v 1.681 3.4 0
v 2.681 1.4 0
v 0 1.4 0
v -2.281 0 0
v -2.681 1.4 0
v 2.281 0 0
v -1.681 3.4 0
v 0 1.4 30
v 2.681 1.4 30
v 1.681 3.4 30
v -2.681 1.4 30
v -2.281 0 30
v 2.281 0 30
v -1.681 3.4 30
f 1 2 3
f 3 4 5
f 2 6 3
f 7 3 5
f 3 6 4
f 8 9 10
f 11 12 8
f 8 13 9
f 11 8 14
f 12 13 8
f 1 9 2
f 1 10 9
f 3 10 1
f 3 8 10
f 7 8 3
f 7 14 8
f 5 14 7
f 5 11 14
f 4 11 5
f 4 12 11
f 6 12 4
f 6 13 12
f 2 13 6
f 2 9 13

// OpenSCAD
//MD = 3.175;
MD = 4.7625;
LAYER_HEIGHT = 0.2;

// REFERENCE CIRCLE
*translate([0, 5 * MD / 6])  circle(d = MD, $fn = 32);

// S
*group() {
  difference() {
    union() {
      rotate([0,0,45]) rotate_extrude(angle = 270, $fn = 128)
        translate([10, 0, 0])
          flatTrack();

      translate([cos(45) * 20, sin(45) * 20])
        rotate([0,0,-135]) rotate_extrude(angle = 270, $fn = 128)
          translate([10, 0, 0])
            flatTrack();
    }
  }
}




module tunnelPair(h, baseTr, base, holeTr, holeD, angle = 5) {
  difference() {
    linear_extrude(h / 3)
      difference() {
        translate(baseTr) 
          square(base);

        translate(holeTr)
          circle(d = holeD, $fn = 32);
      }
      
    rotate([angle, 0, 0]) 
      translate([0, 0, -h / 2]) 
        linear_extrude(h) 
          flatTrack(lowerMid = false);
  }
}

module trackConnectorTunnel(d = MD, h = 5, lh = LAYER_HEIGHT, angle = 5, hExtra = H_EXTRA) {
  holeDLayers = ceil(d * 1.25 / lh);
  holeD = holeDLayers * lh;
  holeTr = [0, holeD - 0.2];

  baseYs = [6, holeDLayers + hExtra];
  base = [d * 2, lh * (baseYs[0] + baseYs[1])];
  baseTr = [-base[0] / 2, -1 * lh * baseYs[0]];
  
  tunnelPair(h, baseTr, base, holeTr, holeD, angle);
    
  translate([0, 0, h / 3])
    linear_extrude(2 * h / 3)
      difference() {
        translate(baseTr) 
          square(base);

        translate(holeTr)
          circle(d = holeD, $fn = 32);
      }
}

H_EXTRA = 20;
hExtra = H_EXTRA;
holeDLayers = ceil(MD * 1.25 / LAYER_HEIGHT);
holeD = holeDLayers * LAYER_HEIGHT;
ty = holeD - 0.2;
baseYs = [6, holeDLayers + hExtra];
base = [MD * 2, LAYER_HEIGHT * (baseYs[0] + baseYs[1])];

*group() {
  trackConnectorTunnel();

  translate([MD, ty, 4.9]) {
    difference() {
      union() {
        translate([-base[0], -base[1] / 2 - 1.4, 0.1])
          hull() {
            linear_extrude(1)
              square([base[0] * 2, base[1] / 1.5]);
            
            translate([0, 3 * base[1] / 6, 8]) 
              linear_extrude(1)
                square([base[0] * 2, base[1] / 6]);          
          }
      }
      
      rotate([90, 0, 0])
        rotate_extrude(angle = 180, convexity = 4, $fn = 64) 
          translate([MD, 0, 0]) 
            circle(d = holeD, $fn = 32);
    }  
  }

  translate([MD * 2, 0])
    trackConnectorTunnel(angle = -5);
}

linear_extrude(30) flatTrack();

*translate([0, MD + 0.15]) circle(d = MD, $fn = 32);


module flatTrack(d = MD, lh = LAYER_HEIGHT, lowerMid = true) {
  ys = [0, 7, 17];
  halfD = d / 2;
  r = d / 2;
  sinHalfD = halfD * sin(45);
  h = lh * 8;
  
  polygon([
    [r, 0],
    [r - 0.1, ys[0] * lh],
    [r + 0.3, ys[1] * lh],
    [r - 0.7, ys[2] * lh],
    lowerMid ? [0, ys[1] * lh] : [0, ys[2] * lh],
    [-r + 0.7, ys[2] * lh],
    [-r - 0.3, ys[1] * lh],
    [-r + 0.1, ys[0] * lh],
    [-r, 0],
  ]);
}

module uTrackSlicer(d = MD) {
  circle(d = d, $fn = 64);
}

module uTrack(d = MD) {
  innerD = d;
  outerD = d + (0.4 * 5);
  
  baseW = outerD * cos(45);
  baseTX = -baseW / 2;
  baseTY = -d / 1.125 * cos(30);
  
  intersection() {
    difference() {
      union() {
        circle(d = outerD, $fn = 8);
        translate([baseTX, baseTY]) 
          square([baseW, d]);
      }
      
      uTrackSlicer(d);
    }
    
    translate([-innerD, baseTY])
      square([innerD * 2, outerD / 3]);
  }
}
